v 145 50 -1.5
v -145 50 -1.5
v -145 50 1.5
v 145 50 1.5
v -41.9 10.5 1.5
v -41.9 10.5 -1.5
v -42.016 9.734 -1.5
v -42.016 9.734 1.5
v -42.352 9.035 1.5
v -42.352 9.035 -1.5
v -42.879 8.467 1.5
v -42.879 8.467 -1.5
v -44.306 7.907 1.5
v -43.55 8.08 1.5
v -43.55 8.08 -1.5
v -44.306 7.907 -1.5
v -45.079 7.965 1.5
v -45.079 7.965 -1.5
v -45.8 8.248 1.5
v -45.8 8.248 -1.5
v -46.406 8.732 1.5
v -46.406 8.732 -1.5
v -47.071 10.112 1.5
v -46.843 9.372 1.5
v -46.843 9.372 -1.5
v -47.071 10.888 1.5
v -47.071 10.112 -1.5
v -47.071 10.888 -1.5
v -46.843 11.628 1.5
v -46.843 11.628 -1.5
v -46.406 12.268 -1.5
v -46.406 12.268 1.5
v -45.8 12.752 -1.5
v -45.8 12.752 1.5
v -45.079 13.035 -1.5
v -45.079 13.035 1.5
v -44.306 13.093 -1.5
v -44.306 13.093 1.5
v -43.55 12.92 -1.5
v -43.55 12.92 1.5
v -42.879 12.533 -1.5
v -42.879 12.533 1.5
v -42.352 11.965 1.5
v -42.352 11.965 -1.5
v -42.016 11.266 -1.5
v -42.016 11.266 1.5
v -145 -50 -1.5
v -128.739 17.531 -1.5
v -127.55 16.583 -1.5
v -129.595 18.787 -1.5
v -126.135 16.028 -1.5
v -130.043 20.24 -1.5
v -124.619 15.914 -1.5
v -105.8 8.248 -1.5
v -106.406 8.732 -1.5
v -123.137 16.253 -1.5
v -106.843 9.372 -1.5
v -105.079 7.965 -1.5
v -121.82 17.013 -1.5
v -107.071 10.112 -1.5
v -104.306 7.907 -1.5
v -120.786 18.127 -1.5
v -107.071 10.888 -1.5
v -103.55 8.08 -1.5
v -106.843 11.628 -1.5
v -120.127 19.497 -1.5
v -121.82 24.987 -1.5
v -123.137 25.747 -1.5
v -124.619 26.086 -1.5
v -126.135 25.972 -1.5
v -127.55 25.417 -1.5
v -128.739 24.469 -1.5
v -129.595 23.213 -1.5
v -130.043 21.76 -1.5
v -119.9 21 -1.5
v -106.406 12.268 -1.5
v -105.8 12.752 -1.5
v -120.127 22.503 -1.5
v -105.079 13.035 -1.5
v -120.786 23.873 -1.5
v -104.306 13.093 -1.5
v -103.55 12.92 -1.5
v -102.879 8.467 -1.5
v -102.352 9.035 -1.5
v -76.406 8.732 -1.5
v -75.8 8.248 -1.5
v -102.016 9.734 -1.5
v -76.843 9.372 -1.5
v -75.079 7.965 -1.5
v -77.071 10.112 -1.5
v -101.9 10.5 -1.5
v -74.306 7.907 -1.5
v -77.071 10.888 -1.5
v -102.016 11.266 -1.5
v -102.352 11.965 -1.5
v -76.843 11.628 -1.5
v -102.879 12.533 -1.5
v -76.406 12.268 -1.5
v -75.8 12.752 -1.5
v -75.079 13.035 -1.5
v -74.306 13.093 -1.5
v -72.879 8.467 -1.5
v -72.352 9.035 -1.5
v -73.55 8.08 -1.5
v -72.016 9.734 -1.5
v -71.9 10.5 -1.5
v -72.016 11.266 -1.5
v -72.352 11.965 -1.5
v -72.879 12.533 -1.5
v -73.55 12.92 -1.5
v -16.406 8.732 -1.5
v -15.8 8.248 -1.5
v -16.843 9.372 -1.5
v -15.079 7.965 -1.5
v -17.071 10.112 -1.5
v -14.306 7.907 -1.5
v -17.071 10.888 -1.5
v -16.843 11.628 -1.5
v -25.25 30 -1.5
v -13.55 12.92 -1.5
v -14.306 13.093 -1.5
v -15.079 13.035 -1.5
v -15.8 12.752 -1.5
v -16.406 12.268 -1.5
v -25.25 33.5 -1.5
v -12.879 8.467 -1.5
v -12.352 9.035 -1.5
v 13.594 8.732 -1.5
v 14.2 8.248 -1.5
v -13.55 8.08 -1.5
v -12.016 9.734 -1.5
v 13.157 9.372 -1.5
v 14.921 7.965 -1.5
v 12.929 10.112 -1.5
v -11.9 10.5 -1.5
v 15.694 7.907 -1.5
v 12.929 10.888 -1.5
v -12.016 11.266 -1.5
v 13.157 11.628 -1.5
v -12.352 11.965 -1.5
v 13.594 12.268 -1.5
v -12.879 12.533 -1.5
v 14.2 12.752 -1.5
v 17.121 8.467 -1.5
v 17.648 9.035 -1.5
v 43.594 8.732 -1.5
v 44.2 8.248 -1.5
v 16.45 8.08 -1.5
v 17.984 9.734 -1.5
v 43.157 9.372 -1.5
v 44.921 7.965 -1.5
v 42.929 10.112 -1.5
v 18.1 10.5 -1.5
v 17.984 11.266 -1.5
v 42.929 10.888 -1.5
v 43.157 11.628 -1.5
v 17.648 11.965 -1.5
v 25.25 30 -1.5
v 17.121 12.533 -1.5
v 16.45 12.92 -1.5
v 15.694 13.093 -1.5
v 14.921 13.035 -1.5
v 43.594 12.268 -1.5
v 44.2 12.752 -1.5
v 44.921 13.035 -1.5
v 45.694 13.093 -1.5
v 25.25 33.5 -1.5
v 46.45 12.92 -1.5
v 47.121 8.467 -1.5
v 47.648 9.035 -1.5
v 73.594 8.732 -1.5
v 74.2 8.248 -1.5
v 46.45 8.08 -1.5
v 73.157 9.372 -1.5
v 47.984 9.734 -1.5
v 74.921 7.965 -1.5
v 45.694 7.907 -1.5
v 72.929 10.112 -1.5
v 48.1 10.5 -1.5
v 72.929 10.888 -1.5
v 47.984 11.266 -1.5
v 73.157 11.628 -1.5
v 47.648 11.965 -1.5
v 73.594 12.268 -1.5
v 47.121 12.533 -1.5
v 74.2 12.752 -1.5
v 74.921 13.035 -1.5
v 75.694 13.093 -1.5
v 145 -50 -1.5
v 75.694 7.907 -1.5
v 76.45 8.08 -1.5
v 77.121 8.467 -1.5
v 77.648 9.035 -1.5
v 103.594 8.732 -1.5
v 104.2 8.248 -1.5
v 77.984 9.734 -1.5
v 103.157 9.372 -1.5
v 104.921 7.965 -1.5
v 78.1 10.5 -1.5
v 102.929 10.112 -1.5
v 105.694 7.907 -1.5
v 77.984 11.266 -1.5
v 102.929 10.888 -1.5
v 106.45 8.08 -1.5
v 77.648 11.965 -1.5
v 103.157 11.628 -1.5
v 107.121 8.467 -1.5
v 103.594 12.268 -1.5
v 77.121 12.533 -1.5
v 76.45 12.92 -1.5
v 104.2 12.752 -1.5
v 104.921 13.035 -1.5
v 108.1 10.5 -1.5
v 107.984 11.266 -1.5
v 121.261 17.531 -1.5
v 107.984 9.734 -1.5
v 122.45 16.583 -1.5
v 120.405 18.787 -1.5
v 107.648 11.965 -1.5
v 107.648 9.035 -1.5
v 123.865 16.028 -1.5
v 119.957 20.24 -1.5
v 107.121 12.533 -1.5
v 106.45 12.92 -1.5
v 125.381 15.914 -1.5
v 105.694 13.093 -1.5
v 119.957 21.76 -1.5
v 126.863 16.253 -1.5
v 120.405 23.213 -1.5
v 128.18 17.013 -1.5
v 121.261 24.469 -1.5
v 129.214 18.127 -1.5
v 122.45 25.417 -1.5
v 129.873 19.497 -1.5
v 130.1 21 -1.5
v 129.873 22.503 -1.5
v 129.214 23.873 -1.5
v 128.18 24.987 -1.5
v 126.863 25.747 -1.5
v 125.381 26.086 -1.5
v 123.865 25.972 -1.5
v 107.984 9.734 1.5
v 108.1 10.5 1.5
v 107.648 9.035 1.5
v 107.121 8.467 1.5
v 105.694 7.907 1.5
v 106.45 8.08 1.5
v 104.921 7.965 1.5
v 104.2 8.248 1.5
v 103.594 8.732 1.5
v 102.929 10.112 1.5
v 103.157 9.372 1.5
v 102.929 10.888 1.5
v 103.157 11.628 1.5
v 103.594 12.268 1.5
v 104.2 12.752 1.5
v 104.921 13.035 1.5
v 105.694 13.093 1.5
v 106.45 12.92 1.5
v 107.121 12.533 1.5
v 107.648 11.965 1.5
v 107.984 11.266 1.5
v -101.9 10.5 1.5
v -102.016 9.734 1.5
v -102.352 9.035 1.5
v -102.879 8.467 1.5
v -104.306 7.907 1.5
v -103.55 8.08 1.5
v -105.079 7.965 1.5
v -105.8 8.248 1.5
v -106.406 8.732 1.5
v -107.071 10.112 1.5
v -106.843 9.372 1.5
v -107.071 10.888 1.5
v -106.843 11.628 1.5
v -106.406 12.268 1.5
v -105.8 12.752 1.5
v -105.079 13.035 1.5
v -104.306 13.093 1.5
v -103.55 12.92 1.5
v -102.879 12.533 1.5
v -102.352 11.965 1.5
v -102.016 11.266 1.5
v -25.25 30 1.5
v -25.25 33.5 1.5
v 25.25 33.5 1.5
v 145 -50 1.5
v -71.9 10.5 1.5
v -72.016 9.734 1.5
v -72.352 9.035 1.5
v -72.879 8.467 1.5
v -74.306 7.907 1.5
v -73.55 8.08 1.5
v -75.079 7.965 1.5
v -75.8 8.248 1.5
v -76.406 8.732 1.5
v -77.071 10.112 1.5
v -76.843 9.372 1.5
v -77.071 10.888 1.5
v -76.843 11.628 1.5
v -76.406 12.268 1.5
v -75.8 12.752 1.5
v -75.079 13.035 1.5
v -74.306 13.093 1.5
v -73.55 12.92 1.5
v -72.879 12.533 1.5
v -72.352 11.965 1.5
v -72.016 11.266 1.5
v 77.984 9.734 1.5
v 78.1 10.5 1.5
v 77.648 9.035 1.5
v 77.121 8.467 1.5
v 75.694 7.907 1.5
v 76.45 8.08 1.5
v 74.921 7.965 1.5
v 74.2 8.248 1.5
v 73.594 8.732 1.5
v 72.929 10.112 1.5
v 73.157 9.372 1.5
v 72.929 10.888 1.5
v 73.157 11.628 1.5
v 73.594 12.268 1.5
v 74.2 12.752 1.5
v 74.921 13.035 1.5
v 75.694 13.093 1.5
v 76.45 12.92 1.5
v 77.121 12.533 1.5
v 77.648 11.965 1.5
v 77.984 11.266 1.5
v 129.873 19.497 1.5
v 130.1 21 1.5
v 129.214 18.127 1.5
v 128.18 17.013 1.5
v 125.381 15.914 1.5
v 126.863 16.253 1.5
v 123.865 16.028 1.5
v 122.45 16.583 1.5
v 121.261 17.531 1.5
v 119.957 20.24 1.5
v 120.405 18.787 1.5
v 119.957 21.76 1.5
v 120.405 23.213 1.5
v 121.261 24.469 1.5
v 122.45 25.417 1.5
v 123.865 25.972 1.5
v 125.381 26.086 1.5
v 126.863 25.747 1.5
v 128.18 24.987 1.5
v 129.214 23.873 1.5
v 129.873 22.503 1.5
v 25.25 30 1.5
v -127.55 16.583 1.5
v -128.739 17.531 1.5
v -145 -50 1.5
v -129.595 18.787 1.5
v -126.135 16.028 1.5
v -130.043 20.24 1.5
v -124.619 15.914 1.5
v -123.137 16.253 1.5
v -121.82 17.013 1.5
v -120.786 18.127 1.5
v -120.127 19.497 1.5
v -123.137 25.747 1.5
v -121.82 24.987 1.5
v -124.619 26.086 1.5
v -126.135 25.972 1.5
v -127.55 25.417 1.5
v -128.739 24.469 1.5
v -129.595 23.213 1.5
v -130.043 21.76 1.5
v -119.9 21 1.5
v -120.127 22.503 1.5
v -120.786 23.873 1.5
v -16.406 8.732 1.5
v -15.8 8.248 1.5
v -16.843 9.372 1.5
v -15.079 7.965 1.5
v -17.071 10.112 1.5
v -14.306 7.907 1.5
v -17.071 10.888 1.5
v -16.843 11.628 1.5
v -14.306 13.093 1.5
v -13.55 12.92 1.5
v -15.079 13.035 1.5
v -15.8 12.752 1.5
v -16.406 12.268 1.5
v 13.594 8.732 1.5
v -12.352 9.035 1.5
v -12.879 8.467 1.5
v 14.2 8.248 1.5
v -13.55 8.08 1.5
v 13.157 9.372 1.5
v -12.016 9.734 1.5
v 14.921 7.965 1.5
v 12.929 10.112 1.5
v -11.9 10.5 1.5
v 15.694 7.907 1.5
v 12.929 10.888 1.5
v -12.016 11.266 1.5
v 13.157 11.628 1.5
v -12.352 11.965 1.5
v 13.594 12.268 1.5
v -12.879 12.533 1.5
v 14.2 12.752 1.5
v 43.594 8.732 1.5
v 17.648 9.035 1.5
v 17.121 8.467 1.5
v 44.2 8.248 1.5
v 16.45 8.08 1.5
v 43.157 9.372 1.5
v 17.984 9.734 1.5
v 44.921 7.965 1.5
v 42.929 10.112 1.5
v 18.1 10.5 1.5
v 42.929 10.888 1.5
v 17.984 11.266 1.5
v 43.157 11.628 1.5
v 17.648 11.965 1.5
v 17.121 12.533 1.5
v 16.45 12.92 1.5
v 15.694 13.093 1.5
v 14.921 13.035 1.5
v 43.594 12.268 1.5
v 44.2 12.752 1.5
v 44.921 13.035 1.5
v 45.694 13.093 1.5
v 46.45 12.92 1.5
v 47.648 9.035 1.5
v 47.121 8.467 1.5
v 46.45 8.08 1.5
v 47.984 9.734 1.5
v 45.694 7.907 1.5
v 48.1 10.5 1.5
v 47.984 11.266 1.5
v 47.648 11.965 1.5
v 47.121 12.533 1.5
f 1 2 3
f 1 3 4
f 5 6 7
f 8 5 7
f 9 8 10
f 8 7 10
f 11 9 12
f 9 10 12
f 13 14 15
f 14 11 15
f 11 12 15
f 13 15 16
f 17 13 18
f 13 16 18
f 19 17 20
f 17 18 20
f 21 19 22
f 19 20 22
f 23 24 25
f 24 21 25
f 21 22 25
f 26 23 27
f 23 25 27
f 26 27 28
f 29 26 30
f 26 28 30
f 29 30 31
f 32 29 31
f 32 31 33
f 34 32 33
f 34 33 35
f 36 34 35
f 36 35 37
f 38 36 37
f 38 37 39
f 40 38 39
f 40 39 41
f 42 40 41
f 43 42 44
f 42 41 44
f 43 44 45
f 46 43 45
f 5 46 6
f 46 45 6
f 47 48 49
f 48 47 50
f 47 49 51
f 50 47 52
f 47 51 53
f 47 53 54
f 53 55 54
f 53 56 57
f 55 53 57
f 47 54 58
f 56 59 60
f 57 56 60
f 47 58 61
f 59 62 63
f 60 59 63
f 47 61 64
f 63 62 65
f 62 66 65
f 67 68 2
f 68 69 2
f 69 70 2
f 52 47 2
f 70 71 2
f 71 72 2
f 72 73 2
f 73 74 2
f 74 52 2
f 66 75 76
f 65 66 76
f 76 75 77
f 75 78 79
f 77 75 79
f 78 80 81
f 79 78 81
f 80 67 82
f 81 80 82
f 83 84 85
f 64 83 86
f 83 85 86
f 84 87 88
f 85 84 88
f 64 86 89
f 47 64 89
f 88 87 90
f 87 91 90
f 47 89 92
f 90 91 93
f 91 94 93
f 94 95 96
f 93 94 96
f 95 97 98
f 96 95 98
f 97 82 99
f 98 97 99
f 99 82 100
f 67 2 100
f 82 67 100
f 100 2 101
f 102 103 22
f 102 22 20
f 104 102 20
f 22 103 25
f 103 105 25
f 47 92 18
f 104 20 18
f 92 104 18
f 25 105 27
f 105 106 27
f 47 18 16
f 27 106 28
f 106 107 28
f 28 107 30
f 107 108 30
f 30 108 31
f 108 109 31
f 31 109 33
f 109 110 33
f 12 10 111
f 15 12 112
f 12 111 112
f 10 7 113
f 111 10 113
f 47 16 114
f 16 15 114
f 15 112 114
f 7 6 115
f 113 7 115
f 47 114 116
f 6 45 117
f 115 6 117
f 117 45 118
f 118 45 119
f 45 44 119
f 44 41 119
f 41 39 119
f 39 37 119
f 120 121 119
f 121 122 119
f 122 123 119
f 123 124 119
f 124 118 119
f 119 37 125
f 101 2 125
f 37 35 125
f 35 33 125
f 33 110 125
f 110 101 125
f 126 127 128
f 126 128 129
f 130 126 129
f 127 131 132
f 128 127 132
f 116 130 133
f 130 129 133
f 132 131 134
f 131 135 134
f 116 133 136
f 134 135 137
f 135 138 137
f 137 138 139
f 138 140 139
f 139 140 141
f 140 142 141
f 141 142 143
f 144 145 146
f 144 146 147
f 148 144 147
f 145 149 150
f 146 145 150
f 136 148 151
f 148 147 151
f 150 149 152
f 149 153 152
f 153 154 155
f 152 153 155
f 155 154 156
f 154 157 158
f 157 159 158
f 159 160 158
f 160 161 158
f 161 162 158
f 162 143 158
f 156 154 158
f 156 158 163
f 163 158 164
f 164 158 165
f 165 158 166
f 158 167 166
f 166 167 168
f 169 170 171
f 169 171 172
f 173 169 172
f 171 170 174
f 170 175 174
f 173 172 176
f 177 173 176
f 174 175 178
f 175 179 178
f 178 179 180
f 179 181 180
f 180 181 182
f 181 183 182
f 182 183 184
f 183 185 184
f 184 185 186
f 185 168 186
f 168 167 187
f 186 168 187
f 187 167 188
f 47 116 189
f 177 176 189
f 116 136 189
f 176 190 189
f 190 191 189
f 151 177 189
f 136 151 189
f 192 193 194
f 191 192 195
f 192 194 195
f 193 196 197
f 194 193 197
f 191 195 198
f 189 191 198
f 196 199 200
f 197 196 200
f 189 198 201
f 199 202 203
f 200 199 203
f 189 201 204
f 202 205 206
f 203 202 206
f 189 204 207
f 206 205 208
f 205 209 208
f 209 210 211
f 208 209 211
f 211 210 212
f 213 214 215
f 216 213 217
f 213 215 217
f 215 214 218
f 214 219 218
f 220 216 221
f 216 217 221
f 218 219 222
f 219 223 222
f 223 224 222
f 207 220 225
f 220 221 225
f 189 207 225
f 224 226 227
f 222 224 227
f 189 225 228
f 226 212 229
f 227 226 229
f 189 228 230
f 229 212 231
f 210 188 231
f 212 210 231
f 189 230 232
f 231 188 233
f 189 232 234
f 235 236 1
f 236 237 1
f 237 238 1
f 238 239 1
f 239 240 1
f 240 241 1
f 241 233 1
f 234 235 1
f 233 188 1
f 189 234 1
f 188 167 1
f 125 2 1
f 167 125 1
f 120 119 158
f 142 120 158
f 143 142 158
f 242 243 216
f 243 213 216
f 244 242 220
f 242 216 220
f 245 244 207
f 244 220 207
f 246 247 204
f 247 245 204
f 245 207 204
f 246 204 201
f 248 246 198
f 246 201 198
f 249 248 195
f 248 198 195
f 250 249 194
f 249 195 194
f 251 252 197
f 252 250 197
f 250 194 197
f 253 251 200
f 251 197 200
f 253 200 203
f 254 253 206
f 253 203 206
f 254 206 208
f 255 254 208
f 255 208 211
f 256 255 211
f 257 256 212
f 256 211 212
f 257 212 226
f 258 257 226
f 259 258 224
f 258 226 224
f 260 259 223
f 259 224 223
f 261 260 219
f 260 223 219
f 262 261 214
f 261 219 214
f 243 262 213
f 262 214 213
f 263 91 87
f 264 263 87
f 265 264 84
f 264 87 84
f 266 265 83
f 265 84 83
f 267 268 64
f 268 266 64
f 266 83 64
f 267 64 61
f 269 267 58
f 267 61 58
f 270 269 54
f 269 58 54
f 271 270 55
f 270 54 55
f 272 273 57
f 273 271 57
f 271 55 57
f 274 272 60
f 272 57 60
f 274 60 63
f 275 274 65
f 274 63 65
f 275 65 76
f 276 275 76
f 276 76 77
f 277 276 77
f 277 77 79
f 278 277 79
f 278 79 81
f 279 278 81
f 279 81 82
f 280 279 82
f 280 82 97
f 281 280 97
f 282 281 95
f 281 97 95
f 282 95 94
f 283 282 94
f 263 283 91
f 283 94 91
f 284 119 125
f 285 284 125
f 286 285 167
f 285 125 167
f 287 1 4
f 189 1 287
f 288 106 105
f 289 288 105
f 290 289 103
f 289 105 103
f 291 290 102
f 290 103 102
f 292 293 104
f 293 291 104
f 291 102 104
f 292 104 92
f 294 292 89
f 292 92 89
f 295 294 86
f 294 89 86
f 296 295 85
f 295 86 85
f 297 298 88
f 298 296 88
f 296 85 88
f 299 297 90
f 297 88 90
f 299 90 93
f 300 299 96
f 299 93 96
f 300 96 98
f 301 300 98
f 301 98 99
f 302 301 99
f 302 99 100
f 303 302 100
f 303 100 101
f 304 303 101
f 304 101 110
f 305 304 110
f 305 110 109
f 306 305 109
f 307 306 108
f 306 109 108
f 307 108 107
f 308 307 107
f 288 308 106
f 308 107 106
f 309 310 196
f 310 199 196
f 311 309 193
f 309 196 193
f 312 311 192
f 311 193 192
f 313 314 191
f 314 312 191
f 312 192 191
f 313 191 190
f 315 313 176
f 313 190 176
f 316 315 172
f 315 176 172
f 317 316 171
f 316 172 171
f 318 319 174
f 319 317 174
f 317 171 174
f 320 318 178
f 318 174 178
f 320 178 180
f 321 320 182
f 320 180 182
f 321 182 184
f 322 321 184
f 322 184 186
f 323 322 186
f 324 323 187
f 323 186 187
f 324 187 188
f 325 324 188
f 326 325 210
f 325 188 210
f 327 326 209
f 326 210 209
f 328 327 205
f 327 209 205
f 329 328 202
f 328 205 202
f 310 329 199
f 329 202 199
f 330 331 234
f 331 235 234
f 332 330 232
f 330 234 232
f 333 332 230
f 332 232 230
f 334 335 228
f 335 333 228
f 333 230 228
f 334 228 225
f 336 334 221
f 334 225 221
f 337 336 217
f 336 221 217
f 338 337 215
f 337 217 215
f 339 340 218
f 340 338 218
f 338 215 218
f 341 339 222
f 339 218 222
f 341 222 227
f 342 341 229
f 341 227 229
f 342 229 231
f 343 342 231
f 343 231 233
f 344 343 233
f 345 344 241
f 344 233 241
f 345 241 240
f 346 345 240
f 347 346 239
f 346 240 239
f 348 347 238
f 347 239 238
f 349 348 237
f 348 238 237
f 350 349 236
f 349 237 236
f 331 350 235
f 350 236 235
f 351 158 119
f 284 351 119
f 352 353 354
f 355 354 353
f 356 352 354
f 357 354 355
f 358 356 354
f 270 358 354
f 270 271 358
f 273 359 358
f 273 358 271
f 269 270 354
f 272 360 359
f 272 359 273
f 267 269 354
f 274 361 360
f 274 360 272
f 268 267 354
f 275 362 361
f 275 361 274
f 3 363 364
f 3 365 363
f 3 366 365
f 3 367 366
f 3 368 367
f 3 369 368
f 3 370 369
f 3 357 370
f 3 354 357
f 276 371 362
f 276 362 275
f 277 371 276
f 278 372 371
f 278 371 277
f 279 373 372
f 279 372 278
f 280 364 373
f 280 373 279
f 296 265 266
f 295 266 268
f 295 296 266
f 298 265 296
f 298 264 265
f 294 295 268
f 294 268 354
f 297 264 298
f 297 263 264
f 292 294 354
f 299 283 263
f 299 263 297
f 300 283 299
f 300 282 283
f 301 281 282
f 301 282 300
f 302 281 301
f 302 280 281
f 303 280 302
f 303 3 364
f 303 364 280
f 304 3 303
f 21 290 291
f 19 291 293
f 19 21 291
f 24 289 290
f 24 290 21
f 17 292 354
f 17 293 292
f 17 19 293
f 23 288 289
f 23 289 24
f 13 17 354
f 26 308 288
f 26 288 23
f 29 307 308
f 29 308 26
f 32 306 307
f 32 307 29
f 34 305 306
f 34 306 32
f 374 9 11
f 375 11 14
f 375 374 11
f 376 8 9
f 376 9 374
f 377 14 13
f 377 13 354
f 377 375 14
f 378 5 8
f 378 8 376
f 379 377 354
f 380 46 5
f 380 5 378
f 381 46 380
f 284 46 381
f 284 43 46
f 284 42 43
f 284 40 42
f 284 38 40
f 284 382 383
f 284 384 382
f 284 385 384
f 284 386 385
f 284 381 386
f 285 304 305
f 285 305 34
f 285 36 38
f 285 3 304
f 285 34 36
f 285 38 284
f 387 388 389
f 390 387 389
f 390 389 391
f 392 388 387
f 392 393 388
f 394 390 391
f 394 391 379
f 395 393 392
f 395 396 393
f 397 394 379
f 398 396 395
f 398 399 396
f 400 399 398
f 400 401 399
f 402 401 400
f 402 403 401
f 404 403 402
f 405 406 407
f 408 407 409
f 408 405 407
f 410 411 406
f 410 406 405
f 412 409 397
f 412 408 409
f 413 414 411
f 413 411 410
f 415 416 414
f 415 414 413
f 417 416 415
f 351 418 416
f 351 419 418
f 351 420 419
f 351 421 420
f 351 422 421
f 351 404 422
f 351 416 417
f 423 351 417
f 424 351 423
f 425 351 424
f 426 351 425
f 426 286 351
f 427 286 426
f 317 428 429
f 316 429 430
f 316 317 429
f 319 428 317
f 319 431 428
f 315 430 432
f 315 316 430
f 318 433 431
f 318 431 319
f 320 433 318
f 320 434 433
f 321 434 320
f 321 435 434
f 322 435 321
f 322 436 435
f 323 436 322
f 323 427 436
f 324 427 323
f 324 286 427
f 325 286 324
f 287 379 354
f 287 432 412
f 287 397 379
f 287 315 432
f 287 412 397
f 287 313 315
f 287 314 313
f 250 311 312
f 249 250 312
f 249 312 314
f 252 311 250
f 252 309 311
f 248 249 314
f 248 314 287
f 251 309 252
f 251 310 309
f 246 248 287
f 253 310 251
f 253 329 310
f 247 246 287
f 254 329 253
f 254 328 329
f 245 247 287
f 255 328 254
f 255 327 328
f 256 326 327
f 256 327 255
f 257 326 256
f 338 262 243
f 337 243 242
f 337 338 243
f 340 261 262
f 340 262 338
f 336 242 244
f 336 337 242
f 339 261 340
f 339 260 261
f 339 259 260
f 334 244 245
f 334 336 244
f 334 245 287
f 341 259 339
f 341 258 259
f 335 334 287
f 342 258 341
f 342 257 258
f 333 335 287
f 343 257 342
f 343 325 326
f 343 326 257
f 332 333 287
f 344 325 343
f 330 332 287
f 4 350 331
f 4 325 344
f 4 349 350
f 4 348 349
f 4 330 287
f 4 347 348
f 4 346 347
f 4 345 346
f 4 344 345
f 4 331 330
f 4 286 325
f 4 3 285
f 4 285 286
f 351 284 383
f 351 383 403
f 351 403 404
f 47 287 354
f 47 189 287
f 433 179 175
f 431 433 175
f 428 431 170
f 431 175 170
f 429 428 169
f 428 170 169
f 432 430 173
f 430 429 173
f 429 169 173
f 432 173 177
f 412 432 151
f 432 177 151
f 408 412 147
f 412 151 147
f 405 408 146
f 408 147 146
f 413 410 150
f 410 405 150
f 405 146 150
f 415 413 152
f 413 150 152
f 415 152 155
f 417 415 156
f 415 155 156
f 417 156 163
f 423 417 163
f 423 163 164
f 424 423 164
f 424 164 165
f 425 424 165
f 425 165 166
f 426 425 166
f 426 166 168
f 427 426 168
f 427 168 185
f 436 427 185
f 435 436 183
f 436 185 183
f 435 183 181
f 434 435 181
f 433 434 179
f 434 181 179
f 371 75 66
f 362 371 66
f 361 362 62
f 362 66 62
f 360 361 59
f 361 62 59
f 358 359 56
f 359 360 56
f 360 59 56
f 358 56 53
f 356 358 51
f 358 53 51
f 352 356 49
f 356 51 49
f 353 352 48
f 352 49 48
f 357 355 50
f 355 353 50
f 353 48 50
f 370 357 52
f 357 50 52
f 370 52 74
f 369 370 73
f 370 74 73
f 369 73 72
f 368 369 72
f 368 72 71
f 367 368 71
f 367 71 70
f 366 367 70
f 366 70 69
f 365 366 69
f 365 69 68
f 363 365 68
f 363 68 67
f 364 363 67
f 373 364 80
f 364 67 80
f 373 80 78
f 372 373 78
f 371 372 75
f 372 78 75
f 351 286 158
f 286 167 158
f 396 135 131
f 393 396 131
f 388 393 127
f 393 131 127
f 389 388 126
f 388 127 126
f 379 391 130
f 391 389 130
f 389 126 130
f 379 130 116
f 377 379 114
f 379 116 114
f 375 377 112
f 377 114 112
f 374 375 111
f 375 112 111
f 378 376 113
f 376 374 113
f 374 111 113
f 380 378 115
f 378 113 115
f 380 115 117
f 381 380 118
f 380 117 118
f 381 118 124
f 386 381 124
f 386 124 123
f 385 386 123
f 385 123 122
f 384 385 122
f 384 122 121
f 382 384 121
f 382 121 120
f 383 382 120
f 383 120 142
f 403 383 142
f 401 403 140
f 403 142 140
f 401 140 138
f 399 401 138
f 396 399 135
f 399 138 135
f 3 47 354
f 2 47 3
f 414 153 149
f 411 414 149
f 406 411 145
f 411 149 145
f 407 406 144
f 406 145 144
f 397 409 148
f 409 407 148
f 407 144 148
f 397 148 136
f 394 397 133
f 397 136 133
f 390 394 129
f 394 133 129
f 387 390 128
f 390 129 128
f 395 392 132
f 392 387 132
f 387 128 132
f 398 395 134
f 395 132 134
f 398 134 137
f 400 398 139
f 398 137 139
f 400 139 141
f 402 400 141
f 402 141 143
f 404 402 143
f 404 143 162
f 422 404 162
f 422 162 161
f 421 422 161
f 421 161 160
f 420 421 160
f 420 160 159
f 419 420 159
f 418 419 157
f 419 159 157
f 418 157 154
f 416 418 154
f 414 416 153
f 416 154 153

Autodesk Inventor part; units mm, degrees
ref_plane "YZ Plane" through (0, 0, 0) normal (1, 0, 0) x (0, 1, 0)
ref_plane "XZ Plane" through (0, 0, 0) normal (0, 1, 0) x (-1, 0, 0)
ref_plane "XY Plane" through (0, 0, 0) normal (0, 0, 1) x (1, 0, 0)
sketch "スケッチ1" plane through (0, 0, 0) normal (0, 0, 1) x (1, 0, 0)
  line L0 (-145, 50) -> (145, 50)
  line L1 (145, 50) -> (145, -50)
  line L2 (145, -50) -> (-145, -50)
  line L3 (-145, -50) -> (-145, 50)
  line L4 (0, -70) -> (0, 70) projected
  line L5 (-203, 0) -> (203, 0) projected
  circle A0 centre (-104.5, 10.5) radius 2.6
  circle A1 centre (-125, 21) radius 5.1
  circle A2 centre (-74.5, 10.5) radius 2.6
  circle A3 centre (-44.5, 10.5) radius 2.6
  circle A4 centre (-14.5, 10.5) radius 2.6
  circle A5 centre (15.5, 10.5) radius 2.6
  circle A6 centre (45.5, 10.5) radius 2.6
  circle A7 centre (75.5, 10.5) radius 2.6
  circle A8 centre (105.5, 10.5) radius 2.6
  line L6 (-25.25, 33.5) -> (25.25, 33.5)
  line L7 (25.25, 33.5) -> (25.25, 30)
  line L8 (25.25, 30) -> (-25.25, 30)
  line L9 (-25.25, 30) -> (-25.25, 33.5)
  circle A9 centre (125, 21) radius 5.1
  point P0 (0, 0)
  dimension "d0" = 100
  dimension "d1" = 290
  dimension "d4" = 5.2
  dimension "d5" = 60.5
  dimension "d6" = 40.5
  dimension "d21" = 10.2
  dimension "d22" = 71
  dimension "d23" = 20
  dimension "d26" = 30
  dimension "d31" = 16.5
  dimension "d32" = 50.5
  dimension "d33" = 3.5
extrude "押し出し1" add sketch "スケッチ1" along normal mid plane 3 contours L0 L4 L6 L9 L8 L5 L3 | L0 L1 L5 L4 L8 L7 L6 | L5 L4 L2 L3 | L5 L1 L2 L4
properties part number "wall_ver.1"
